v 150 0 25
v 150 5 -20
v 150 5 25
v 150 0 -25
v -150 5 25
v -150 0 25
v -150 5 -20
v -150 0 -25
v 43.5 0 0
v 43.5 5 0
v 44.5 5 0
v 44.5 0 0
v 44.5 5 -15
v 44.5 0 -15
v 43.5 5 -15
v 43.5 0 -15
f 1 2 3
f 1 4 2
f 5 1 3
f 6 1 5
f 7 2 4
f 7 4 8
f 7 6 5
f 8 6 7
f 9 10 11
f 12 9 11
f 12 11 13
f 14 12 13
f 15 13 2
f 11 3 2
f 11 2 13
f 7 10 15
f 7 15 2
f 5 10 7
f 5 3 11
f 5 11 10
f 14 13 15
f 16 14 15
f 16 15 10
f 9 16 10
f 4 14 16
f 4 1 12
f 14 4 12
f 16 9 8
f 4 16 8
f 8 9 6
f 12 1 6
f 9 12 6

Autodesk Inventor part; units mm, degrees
ref_plane "YZ Plane" through (0, 0, 0) normal (1, 0, 0) x (0, 1, 0)
ref_plane "XZ Plane" through (0, 0, 0) normal (0, 1, 0) x (-1, 0, 0)
ref_plane "XY Plane" through (0, 0, 0) normal (0, 0, 1) x (1, 0, 0)
sketch "スケッチ1" plane through (0, 0, 0) normal (0, 1, 0) x (-1, 0, 0)
  line L0 (150, -25) -> (-150, -25)
  line L1 (-150, -25) -> (-150, 25)
  line L2 (-150, 25) -> (150, 25)
  line L3 (150, 25) -> (150, -25)
  line L4 (150, -25) -> (-150, 25) construction
  line L5 (-150, -25) -> (150, 25) construction
  line L6 (150, -25) -> (70, -25)
  line L7 (70, -25) -> (70, -60)
  line L8 (70, -60) -> (150, -60)
  line L9 (150, -60) -> (150, -25)
  line L10 (0, 25) -> (0, -116.583)
  line L11 (-70, -25) -> (-70, -60)
  line L12 (-70, -60) -> (-150, -60)
  line L13 (-150, -60) -> (-150, -25)
  point P0 (0, 0)
  dimension "d0" = 300
  dimension "d1" = 50
  dimension "d7" = 80
  dimension "d8" = 35
extrude "押し出し1" add sketch "スケッチ1" along normal blind 5 contours L0 L10 L2 L3 | L0 L1 L2 L10
chamfer "面取り1" distance 5 angle 45 1 edges at (0, 5, -25)
sketch "スケッチ4" plane through (0, 5, 0) normal (0, 1, 0) x (1, 0, 0)
  line L0 (48, 20) -> (40, 20)
  line L1 (40, 20) -> (40, -5)
  line L2 (40, -5) -> (48, -5)
  line L3 (48, -5) -> (48, 20)
  line L4 (43.5, 0) -> (44.5, 0)
  line L5 (44.5, 0) -> (44.5, 15)
  line L6 (44.5, 15) -> (43.5, 15)
  line L7 (43.5, 15) -> (43.5, 0)
  line L8 (-150, 20) -> (150, 20) projected
  point P0 (0, 0)
  point P1 (44, 0)
  point P2 (44, -5)
  point P3 (43.5, 7.5)
  point P4 (40, 7.5)
  dimension "d12" = 8
  dimension "d13" = 25
  dimension "d14" = 1
  dimension "d15" = 15
  dimension "d22" = 40
extrude "押し出し4" cut sketch "スケッチ4" against normal through all contours L7 L6 L5 L4
properties part number "HoriMove" material "スタイロフォームIB"
